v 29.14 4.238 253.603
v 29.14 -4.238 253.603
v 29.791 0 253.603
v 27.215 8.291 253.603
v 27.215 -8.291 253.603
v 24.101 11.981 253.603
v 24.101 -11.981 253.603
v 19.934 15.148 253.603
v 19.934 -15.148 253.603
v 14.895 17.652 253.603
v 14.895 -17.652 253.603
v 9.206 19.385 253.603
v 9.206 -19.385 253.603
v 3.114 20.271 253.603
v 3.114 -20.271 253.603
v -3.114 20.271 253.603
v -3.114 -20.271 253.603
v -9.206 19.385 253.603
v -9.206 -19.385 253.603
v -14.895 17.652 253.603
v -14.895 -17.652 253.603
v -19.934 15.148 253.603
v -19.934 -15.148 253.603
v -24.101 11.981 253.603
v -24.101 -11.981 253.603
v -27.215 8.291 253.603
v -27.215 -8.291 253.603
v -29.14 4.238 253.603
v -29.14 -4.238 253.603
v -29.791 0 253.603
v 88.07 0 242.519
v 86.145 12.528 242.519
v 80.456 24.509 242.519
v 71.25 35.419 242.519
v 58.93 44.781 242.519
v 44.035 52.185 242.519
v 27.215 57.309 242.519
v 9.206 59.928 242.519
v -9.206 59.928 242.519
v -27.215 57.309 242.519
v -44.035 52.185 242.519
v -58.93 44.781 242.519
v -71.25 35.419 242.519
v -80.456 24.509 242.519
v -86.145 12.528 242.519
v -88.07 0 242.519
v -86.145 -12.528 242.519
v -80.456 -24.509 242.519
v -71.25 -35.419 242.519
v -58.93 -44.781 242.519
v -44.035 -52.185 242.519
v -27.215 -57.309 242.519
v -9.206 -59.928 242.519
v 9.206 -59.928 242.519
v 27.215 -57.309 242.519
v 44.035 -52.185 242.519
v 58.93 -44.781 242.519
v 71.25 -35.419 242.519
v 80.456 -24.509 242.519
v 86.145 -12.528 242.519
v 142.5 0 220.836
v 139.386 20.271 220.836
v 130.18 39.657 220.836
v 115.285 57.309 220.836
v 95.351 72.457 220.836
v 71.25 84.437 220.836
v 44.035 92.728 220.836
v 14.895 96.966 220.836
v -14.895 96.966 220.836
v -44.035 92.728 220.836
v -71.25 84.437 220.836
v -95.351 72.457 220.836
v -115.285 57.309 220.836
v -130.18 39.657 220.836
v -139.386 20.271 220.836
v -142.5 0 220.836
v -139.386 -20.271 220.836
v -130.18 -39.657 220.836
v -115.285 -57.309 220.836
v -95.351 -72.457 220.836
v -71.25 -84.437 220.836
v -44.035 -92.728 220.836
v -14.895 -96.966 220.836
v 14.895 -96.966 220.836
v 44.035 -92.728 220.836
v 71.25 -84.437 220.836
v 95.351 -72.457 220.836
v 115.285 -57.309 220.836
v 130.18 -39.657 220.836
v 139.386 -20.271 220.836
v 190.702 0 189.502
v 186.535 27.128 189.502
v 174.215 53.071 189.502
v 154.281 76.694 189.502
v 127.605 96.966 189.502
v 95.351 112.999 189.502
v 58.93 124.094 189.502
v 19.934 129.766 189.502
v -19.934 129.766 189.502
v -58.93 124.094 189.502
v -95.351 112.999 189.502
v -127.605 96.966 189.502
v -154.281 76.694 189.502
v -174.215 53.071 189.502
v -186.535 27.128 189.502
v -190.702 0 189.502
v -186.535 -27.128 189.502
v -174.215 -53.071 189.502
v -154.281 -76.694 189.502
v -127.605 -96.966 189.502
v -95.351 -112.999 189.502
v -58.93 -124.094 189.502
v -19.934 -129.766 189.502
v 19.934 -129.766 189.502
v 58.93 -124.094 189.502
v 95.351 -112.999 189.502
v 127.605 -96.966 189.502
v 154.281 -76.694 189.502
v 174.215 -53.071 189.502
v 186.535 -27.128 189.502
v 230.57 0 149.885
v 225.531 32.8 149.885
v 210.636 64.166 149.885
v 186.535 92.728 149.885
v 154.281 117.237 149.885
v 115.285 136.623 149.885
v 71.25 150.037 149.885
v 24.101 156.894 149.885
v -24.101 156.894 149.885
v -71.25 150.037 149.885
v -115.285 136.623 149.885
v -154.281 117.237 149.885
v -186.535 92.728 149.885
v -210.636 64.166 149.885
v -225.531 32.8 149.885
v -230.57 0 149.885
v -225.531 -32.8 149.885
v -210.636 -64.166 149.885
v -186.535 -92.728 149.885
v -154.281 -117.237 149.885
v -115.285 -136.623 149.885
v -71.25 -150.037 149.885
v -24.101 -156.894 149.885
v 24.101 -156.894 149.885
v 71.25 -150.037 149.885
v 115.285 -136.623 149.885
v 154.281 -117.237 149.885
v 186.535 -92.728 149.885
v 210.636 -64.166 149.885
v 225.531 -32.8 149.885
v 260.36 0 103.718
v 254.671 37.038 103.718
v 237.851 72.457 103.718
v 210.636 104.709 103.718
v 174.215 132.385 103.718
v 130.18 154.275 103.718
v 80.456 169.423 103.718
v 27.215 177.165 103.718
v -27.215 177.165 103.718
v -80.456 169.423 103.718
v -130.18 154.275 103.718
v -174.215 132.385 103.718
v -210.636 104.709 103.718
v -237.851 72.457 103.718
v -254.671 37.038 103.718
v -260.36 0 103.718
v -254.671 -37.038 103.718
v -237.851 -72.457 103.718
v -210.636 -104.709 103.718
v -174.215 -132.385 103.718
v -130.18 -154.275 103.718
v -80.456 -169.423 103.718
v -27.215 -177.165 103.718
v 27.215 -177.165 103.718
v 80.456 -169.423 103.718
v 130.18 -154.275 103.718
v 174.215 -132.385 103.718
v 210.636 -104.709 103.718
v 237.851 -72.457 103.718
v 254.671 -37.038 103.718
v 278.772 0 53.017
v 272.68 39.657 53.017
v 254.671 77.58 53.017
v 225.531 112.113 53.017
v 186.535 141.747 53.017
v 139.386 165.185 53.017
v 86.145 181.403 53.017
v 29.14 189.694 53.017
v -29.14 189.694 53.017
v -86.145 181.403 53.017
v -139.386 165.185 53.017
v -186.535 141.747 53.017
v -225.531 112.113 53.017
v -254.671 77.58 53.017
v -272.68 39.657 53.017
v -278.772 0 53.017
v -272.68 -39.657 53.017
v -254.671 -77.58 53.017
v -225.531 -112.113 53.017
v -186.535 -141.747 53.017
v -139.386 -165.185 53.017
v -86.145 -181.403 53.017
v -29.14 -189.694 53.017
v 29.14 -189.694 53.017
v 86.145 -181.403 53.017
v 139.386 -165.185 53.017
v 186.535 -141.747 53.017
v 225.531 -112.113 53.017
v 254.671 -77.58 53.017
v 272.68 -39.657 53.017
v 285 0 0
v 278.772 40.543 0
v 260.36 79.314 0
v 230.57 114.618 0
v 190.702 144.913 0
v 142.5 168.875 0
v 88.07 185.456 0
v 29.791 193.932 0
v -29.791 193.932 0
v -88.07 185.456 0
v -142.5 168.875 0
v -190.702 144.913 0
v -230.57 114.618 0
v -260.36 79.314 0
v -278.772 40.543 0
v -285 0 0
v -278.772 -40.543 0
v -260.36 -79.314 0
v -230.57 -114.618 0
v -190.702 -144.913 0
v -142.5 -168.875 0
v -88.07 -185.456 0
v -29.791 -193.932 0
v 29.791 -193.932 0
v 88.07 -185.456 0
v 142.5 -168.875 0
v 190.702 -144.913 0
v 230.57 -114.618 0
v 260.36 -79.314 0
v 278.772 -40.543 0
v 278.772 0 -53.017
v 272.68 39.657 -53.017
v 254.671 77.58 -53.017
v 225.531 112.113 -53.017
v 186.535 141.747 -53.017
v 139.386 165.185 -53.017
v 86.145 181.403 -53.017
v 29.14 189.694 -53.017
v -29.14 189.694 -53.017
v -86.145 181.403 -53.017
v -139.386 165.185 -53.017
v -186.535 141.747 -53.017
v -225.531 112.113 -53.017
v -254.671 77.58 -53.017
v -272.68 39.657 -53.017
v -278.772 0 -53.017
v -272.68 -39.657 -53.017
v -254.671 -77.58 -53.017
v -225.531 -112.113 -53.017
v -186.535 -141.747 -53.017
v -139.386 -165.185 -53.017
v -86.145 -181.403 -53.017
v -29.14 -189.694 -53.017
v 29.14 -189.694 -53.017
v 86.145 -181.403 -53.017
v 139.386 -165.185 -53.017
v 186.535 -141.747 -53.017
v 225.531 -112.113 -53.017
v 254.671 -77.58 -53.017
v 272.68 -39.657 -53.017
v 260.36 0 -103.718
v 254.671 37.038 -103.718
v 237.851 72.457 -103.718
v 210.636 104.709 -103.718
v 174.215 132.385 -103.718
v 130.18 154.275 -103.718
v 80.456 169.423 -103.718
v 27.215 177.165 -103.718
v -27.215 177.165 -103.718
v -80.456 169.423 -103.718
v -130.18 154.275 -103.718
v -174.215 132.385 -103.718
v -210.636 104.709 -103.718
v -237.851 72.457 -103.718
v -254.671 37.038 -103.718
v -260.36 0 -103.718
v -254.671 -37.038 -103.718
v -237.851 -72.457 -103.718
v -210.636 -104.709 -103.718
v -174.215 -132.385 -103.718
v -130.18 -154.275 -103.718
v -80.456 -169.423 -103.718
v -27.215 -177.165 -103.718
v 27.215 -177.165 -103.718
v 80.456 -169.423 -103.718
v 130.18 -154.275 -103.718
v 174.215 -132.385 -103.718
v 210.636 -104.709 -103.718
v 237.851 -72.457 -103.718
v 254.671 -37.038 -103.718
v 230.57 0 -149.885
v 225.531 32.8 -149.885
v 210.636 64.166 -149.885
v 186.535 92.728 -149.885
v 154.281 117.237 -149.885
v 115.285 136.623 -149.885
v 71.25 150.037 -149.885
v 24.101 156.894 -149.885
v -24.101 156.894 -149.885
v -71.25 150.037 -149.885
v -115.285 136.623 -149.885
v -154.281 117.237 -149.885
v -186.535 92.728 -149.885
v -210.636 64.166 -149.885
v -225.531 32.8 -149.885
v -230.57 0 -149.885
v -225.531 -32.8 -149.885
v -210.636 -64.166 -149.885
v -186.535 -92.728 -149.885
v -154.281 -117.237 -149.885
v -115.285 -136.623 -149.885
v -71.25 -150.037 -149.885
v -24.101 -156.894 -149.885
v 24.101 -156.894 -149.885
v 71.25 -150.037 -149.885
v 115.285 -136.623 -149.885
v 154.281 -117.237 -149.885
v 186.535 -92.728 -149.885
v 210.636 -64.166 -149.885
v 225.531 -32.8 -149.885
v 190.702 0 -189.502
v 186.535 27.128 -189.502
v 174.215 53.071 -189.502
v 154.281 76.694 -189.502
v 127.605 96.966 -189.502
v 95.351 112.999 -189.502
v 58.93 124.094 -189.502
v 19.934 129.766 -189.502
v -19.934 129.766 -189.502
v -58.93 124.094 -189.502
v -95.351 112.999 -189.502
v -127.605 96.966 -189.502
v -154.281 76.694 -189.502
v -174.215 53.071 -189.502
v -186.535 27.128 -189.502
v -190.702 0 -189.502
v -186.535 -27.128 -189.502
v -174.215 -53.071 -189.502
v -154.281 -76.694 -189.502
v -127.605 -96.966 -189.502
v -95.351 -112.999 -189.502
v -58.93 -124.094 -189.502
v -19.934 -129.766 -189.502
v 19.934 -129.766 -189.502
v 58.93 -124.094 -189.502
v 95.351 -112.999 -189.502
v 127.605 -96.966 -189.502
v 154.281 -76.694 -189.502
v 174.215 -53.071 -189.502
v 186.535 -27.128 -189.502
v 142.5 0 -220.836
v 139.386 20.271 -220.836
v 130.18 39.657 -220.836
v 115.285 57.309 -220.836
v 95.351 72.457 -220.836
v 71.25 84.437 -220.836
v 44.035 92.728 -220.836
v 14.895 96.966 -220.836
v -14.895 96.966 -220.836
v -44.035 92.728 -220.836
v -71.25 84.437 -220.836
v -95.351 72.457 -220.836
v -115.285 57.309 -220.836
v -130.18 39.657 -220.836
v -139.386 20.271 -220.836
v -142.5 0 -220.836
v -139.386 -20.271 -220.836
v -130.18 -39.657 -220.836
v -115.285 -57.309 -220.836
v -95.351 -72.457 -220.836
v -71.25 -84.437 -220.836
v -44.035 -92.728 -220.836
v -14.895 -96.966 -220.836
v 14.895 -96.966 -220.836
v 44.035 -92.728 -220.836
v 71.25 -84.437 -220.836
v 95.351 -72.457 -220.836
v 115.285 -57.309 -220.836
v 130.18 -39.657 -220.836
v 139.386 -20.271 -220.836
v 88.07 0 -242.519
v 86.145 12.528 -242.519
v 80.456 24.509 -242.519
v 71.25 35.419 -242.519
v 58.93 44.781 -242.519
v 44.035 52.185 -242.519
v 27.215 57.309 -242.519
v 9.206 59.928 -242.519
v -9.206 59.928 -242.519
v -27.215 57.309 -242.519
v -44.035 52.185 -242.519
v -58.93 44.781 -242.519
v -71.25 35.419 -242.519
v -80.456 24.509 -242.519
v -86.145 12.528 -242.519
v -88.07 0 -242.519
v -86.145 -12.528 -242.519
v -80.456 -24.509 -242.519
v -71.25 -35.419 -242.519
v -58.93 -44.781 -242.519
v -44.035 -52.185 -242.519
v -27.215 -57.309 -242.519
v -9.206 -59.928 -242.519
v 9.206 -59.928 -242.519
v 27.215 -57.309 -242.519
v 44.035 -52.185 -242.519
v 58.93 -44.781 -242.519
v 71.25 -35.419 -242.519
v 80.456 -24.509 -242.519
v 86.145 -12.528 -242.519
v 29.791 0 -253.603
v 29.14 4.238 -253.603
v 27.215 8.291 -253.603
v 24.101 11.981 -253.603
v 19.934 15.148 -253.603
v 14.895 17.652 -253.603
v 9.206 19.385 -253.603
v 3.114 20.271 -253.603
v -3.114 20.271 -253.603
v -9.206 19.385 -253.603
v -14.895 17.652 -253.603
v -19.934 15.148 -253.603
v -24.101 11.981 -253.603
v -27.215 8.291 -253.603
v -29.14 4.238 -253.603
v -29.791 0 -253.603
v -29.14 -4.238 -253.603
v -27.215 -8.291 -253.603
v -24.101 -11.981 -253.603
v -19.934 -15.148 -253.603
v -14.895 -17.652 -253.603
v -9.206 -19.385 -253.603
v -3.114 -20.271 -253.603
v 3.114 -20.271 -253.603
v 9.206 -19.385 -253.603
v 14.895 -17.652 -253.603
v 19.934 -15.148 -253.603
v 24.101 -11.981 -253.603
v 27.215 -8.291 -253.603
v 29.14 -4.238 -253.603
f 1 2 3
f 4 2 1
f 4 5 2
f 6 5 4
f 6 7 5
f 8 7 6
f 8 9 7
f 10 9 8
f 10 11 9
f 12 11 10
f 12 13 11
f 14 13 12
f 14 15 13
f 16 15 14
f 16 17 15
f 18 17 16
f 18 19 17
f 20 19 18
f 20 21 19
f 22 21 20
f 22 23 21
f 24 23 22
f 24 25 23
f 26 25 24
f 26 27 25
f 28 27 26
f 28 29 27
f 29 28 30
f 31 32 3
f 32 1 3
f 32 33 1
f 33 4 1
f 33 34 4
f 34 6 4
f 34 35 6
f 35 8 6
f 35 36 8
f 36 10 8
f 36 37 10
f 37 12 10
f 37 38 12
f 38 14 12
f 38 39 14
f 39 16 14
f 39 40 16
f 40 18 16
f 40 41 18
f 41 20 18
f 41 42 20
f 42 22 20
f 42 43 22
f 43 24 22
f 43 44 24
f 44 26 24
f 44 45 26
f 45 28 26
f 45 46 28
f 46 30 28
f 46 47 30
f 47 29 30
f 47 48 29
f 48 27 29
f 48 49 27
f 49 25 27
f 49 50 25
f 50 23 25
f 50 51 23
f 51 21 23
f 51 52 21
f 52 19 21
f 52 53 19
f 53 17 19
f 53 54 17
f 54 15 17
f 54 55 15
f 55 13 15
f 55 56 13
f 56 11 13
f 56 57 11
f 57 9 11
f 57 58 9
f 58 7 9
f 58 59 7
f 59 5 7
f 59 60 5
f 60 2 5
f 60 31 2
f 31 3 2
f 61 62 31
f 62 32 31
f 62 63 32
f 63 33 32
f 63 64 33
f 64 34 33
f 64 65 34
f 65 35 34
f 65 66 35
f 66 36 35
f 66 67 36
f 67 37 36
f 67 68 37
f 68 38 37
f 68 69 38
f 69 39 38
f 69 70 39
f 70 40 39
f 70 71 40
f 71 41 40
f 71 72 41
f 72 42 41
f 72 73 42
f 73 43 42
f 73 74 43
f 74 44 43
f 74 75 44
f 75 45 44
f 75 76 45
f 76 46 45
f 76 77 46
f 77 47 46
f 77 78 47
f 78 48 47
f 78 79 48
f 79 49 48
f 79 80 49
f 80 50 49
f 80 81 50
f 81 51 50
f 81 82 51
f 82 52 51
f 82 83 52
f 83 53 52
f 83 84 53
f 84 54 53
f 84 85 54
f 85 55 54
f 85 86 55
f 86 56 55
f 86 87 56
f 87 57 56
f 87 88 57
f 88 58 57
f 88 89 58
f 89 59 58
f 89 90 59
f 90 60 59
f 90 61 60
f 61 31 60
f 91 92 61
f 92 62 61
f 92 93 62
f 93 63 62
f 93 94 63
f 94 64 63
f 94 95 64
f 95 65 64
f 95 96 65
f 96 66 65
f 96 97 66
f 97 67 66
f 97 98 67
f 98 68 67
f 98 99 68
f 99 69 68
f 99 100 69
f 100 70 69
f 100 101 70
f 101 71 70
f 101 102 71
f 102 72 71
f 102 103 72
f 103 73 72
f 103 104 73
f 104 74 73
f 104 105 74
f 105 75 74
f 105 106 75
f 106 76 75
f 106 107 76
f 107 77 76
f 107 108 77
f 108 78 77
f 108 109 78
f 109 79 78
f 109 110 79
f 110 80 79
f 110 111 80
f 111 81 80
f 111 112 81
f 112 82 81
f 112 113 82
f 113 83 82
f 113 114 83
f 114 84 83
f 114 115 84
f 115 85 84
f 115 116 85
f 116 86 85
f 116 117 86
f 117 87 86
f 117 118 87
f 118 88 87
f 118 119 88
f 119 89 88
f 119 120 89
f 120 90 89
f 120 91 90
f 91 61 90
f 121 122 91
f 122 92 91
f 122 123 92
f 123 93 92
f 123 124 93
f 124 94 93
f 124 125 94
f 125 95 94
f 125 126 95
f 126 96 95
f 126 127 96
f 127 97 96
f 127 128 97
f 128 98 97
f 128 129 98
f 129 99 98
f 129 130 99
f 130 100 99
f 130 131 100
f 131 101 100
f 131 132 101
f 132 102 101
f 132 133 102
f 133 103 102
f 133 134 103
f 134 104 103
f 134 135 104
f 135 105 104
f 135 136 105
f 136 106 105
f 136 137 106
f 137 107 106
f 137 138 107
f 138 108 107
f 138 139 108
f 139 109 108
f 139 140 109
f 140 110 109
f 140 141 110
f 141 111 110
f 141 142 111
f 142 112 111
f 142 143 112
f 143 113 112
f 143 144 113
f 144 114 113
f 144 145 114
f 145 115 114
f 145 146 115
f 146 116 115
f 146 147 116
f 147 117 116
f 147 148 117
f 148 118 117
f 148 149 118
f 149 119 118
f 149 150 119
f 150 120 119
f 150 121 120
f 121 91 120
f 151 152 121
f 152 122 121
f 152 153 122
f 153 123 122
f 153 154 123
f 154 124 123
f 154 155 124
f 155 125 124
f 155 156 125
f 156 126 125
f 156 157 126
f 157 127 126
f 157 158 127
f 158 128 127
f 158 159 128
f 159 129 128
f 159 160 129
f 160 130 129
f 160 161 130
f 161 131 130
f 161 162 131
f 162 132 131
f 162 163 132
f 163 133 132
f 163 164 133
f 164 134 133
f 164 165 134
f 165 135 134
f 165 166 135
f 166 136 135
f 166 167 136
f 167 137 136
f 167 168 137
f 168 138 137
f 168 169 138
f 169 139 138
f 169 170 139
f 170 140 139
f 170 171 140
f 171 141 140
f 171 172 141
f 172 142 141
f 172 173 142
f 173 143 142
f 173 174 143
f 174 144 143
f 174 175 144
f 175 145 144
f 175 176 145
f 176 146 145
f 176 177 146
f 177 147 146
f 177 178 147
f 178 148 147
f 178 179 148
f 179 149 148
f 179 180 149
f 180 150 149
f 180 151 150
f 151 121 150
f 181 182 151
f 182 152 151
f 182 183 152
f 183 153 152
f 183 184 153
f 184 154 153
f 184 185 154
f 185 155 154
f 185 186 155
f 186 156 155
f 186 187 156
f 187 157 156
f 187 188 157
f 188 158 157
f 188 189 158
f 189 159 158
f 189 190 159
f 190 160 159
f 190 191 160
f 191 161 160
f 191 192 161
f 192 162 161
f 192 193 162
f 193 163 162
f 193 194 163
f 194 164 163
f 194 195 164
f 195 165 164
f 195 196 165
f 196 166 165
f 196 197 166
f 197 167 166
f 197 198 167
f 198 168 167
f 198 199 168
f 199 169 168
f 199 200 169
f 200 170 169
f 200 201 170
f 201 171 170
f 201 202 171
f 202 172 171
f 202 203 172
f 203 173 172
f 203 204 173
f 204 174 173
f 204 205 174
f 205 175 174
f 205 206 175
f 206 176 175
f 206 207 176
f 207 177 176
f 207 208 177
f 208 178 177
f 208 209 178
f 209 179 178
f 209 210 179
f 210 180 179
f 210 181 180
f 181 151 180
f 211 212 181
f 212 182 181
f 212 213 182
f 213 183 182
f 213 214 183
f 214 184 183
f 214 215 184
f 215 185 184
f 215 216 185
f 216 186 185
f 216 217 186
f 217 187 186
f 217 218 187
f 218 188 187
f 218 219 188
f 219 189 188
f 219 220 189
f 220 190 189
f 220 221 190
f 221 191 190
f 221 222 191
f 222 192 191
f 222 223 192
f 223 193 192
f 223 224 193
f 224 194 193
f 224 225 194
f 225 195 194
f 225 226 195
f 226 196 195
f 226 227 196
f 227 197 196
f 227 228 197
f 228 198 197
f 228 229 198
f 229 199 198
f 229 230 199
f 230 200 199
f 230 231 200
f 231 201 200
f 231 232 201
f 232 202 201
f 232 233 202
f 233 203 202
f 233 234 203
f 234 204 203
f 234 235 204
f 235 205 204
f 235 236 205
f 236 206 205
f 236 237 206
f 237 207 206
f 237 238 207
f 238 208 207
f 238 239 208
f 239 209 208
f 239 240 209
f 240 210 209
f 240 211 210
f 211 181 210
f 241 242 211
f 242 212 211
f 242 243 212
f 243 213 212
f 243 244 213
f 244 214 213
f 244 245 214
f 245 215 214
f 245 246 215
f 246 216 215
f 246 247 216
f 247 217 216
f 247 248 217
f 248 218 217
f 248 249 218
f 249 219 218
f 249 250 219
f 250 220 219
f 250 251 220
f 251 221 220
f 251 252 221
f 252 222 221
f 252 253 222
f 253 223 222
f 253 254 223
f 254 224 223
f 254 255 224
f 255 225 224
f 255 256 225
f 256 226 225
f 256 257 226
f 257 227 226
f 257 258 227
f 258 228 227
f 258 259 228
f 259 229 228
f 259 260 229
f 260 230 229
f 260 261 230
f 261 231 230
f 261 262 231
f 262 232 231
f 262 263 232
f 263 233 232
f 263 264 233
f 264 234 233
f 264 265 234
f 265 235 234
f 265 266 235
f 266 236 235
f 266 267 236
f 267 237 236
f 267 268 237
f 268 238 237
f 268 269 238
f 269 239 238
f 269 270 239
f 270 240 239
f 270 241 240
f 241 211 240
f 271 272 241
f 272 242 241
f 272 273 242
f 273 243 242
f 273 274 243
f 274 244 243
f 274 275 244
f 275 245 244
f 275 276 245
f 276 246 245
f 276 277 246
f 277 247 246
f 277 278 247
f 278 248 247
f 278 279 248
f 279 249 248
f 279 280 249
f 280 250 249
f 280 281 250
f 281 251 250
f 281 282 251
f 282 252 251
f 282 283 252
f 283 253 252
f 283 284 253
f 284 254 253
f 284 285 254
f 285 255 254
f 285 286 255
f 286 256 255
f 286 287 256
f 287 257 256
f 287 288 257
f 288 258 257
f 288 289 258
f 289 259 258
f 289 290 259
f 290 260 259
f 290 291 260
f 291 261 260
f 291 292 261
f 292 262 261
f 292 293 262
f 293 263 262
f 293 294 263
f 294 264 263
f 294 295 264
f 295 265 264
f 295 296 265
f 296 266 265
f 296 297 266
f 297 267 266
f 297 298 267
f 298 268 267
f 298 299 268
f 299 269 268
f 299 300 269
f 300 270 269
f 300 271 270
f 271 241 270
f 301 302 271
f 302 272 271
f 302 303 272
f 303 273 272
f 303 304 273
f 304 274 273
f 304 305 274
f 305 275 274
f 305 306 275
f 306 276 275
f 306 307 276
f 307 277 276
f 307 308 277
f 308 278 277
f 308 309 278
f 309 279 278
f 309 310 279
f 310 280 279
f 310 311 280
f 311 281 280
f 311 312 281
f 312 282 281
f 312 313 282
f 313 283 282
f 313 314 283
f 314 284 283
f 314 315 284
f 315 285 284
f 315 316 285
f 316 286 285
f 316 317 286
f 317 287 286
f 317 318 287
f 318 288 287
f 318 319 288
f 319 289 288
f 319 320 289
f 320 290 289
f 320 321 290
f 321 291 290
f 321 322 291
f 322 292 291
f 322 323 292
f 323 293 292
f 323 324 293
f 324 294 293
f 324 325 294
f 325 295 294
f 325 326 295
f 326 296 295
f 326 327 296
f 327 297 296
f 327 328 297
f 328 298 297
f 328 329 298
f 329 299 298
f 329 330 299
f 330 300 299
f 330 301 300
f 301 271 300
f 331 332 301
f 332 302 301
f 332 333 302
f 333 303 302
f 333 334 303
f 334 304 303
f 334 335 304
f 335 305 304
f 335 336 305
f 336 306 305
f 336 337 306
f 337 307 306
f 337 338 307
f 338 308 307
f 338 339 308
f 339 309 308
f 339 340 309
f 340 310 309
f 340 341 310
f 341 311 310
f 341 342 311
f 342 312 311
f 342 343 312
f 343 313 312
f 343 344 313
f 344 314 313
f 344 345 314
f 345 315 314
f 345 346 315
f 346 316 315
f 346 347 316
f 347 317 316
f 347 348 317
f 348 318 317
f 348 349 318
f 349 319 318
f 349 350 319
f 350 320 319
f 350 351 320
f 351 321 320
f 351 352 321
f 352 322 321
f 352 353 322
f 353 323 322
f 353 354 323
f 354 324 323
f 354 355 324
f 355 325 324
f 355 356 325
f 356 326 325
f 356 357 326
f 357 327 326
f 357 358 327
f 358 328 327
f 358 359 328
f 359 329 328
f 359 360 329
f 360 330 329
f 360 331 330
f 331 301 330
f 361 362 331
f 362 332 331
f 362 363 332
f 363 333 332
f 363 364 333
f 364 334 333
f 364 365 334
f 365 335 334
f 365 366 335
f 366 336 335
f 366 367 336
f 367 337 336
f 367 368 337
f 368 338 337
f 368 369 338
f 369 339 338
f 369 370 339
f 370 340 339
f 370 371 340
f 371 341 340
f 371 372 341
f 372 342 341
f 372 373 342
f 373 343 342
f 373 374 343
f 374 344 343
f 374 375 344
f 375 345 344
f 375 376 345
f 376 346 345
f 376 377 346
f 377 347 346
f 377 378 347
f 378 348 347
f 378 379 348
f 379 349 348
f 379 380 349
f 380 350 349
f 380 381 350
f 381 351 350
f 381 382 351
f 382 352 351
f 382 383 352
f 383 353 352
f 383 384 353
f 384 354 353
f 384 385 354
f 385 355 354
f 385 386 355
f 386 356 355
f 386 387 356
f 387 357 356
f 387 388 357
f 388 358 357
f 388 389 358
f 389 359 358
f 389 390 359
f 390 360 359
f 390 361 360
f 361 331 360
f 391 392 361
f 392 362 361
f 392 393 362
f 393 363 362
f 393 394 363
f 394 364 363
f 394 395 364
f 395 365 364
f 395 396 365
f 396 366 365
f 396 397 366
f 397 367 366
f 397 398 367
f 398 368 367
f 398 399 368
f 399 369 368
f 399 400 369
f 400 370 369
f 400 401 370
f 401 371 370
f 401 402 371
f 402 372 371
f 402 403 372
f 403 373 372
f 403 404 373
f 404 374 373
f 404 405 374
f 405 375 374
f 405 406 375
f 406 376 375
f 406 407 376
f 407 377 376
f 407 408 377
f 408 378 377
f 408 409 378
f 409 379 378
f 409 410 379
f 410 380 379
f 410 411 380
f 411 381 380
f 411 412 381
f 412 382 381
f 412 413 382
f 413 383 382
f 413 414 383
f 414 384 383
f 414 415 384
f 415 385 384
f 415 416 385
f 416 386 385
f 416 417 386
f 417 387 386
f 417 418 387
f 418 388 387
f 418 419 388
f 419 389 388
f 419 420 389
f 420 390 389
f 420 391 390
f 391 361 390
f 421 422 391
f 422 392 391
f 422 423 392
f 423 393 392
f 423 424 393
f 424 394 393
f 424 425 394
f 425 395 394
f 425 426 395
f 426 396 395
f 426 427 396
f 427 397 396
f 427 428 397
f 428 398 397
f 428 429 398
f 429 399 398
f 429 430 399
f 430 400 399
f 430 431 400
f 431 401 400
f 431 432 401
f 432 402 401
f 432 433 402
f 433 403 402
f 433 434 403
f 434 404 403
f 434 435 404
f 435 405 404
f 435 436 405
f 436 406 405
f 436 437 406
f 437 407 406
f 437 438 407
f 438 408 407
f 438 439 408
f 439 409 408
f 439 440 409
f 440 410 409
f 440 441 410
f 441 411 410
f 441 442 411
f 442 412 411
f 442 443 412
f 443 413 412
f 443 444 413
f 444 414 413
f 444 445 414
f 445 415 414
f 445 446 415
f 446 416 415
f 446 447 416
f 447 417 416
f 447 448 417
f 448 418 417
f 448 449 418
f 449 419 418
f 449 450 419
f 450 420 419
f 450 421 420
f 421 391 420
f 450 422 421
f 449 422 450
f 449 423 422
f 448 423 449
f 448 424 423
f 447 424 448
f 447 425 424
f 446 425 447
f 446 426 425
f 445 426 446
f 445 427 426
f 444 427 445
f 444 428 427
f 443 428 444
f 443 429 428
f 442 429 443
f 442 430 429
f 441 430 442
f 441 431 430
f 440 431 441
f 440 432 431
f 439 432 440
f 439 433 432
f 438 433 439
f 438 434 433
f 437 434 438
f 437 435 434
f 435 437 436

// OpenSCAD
// Generated by SolidPython 1.0.1 on 2020-07-29 00:46:54


scale(v = [19, 13, 17]) {
	sphere(r = 15);
}
/***********************************************
*********      SolidPython code:      **********
************************************************
 
# import packages: SolidPython
from solid import *
from solid.utils import *
from itertools import chain, combinations, permutations


class Resize:

    def __init__(self, scad_file):
        self.scad_file = scad_file
        #self.scad_file = import_scad(scad_file)
        # cone/cylinder param:
        self.r1 = 0
        self.r2 = 0
        self.h = 0
        # rectangular prism param:
        self.w = 0
        self.l = 0
        # ellipse param:
        self.r = 0

    # import OpenScad code (file name corresponds to shape)


    # classify shape + parameters
    def assign(self, param1, param2, param3):
        if self.scad_file == 'cone.scad':
            self.r1 = param1
            self.r2 = param2
            self.h = param3
        elif self.scad_file == 'cylinder.scad':
            self.r1 = param1
            self.r2 = param2
            self.h = param3
        elif self.scad_file == 'rectangularPrism.scad':
            self.h = param1
            self.l = param2
            self.w = param3
        else:
            self.r = param1
            self.h = param2

    # resize parameters
    def iterate(self):
        x = range(3, 20, 2)
        i = 1
        if self.scad_file == 'cone.scad':
            tempList = list(permutations(x, 2))
            for temp in tempList:
                param1 = temp[0]
                param2 = temp[1]
                filepath = 'produced_scad_files/' + 'cone' + str(param1) + '_' + str(param2) + '_' + '.scad'
                scad_render_to_file(cylinder(h=param1, r1=param2, r2=0), filepath)

        elif self.scad_file == 'cylinder.scad':
            tempList = list(permutations(x, 3))
            for temp in tempList:
                param1 = temp[0]
                param2 = temp[1]
                filepath = 'produced_scad_files/' + 'cylinder' + str(param1) + '_' + str(param2) + '_' + '.scad'
                scad_render_to_file(cylinder(h=param1, r1=param2, r2=param2), filepath)

        elif self.scad_file == 'rectangularPrism.scad':
            tempList = list(permutations(x, 3))
            for temp in tempList:
                param1 = temp[0]
                param2 = temp[1]
                param3 = temp[2]
                filepath = 'produced_scad_files/' + 'rectangularPrism' + str(param1) + '_' + str(param2) + '_' + str(
                    param3) + '.scad'
                scad_render_to_file(cube(size=(param1, param2, param3)), filepath)

        elif self.scad_file == 'ellipse.scad':
            tempList = list(permutations(x, 4))
            for temp in tempList:
                param1 = temp[0]
                param2 = temp[1]
                param3 = temp[2]
                param4 = temp[3]
                filepath = 'produced_scad_files/' + 'ellipse' + str(param1) + '_' + str(param2) + '_' + str(param3) + '_' + str(param4) + '.scad'
                scad_render_to_file(scale([param1, param2, param3])(sphere(r=param4)), filepath)

    def render_to_scadfile(self):
        scad_render_to_file(scad, 'example.scad') 
 
************************************************/
